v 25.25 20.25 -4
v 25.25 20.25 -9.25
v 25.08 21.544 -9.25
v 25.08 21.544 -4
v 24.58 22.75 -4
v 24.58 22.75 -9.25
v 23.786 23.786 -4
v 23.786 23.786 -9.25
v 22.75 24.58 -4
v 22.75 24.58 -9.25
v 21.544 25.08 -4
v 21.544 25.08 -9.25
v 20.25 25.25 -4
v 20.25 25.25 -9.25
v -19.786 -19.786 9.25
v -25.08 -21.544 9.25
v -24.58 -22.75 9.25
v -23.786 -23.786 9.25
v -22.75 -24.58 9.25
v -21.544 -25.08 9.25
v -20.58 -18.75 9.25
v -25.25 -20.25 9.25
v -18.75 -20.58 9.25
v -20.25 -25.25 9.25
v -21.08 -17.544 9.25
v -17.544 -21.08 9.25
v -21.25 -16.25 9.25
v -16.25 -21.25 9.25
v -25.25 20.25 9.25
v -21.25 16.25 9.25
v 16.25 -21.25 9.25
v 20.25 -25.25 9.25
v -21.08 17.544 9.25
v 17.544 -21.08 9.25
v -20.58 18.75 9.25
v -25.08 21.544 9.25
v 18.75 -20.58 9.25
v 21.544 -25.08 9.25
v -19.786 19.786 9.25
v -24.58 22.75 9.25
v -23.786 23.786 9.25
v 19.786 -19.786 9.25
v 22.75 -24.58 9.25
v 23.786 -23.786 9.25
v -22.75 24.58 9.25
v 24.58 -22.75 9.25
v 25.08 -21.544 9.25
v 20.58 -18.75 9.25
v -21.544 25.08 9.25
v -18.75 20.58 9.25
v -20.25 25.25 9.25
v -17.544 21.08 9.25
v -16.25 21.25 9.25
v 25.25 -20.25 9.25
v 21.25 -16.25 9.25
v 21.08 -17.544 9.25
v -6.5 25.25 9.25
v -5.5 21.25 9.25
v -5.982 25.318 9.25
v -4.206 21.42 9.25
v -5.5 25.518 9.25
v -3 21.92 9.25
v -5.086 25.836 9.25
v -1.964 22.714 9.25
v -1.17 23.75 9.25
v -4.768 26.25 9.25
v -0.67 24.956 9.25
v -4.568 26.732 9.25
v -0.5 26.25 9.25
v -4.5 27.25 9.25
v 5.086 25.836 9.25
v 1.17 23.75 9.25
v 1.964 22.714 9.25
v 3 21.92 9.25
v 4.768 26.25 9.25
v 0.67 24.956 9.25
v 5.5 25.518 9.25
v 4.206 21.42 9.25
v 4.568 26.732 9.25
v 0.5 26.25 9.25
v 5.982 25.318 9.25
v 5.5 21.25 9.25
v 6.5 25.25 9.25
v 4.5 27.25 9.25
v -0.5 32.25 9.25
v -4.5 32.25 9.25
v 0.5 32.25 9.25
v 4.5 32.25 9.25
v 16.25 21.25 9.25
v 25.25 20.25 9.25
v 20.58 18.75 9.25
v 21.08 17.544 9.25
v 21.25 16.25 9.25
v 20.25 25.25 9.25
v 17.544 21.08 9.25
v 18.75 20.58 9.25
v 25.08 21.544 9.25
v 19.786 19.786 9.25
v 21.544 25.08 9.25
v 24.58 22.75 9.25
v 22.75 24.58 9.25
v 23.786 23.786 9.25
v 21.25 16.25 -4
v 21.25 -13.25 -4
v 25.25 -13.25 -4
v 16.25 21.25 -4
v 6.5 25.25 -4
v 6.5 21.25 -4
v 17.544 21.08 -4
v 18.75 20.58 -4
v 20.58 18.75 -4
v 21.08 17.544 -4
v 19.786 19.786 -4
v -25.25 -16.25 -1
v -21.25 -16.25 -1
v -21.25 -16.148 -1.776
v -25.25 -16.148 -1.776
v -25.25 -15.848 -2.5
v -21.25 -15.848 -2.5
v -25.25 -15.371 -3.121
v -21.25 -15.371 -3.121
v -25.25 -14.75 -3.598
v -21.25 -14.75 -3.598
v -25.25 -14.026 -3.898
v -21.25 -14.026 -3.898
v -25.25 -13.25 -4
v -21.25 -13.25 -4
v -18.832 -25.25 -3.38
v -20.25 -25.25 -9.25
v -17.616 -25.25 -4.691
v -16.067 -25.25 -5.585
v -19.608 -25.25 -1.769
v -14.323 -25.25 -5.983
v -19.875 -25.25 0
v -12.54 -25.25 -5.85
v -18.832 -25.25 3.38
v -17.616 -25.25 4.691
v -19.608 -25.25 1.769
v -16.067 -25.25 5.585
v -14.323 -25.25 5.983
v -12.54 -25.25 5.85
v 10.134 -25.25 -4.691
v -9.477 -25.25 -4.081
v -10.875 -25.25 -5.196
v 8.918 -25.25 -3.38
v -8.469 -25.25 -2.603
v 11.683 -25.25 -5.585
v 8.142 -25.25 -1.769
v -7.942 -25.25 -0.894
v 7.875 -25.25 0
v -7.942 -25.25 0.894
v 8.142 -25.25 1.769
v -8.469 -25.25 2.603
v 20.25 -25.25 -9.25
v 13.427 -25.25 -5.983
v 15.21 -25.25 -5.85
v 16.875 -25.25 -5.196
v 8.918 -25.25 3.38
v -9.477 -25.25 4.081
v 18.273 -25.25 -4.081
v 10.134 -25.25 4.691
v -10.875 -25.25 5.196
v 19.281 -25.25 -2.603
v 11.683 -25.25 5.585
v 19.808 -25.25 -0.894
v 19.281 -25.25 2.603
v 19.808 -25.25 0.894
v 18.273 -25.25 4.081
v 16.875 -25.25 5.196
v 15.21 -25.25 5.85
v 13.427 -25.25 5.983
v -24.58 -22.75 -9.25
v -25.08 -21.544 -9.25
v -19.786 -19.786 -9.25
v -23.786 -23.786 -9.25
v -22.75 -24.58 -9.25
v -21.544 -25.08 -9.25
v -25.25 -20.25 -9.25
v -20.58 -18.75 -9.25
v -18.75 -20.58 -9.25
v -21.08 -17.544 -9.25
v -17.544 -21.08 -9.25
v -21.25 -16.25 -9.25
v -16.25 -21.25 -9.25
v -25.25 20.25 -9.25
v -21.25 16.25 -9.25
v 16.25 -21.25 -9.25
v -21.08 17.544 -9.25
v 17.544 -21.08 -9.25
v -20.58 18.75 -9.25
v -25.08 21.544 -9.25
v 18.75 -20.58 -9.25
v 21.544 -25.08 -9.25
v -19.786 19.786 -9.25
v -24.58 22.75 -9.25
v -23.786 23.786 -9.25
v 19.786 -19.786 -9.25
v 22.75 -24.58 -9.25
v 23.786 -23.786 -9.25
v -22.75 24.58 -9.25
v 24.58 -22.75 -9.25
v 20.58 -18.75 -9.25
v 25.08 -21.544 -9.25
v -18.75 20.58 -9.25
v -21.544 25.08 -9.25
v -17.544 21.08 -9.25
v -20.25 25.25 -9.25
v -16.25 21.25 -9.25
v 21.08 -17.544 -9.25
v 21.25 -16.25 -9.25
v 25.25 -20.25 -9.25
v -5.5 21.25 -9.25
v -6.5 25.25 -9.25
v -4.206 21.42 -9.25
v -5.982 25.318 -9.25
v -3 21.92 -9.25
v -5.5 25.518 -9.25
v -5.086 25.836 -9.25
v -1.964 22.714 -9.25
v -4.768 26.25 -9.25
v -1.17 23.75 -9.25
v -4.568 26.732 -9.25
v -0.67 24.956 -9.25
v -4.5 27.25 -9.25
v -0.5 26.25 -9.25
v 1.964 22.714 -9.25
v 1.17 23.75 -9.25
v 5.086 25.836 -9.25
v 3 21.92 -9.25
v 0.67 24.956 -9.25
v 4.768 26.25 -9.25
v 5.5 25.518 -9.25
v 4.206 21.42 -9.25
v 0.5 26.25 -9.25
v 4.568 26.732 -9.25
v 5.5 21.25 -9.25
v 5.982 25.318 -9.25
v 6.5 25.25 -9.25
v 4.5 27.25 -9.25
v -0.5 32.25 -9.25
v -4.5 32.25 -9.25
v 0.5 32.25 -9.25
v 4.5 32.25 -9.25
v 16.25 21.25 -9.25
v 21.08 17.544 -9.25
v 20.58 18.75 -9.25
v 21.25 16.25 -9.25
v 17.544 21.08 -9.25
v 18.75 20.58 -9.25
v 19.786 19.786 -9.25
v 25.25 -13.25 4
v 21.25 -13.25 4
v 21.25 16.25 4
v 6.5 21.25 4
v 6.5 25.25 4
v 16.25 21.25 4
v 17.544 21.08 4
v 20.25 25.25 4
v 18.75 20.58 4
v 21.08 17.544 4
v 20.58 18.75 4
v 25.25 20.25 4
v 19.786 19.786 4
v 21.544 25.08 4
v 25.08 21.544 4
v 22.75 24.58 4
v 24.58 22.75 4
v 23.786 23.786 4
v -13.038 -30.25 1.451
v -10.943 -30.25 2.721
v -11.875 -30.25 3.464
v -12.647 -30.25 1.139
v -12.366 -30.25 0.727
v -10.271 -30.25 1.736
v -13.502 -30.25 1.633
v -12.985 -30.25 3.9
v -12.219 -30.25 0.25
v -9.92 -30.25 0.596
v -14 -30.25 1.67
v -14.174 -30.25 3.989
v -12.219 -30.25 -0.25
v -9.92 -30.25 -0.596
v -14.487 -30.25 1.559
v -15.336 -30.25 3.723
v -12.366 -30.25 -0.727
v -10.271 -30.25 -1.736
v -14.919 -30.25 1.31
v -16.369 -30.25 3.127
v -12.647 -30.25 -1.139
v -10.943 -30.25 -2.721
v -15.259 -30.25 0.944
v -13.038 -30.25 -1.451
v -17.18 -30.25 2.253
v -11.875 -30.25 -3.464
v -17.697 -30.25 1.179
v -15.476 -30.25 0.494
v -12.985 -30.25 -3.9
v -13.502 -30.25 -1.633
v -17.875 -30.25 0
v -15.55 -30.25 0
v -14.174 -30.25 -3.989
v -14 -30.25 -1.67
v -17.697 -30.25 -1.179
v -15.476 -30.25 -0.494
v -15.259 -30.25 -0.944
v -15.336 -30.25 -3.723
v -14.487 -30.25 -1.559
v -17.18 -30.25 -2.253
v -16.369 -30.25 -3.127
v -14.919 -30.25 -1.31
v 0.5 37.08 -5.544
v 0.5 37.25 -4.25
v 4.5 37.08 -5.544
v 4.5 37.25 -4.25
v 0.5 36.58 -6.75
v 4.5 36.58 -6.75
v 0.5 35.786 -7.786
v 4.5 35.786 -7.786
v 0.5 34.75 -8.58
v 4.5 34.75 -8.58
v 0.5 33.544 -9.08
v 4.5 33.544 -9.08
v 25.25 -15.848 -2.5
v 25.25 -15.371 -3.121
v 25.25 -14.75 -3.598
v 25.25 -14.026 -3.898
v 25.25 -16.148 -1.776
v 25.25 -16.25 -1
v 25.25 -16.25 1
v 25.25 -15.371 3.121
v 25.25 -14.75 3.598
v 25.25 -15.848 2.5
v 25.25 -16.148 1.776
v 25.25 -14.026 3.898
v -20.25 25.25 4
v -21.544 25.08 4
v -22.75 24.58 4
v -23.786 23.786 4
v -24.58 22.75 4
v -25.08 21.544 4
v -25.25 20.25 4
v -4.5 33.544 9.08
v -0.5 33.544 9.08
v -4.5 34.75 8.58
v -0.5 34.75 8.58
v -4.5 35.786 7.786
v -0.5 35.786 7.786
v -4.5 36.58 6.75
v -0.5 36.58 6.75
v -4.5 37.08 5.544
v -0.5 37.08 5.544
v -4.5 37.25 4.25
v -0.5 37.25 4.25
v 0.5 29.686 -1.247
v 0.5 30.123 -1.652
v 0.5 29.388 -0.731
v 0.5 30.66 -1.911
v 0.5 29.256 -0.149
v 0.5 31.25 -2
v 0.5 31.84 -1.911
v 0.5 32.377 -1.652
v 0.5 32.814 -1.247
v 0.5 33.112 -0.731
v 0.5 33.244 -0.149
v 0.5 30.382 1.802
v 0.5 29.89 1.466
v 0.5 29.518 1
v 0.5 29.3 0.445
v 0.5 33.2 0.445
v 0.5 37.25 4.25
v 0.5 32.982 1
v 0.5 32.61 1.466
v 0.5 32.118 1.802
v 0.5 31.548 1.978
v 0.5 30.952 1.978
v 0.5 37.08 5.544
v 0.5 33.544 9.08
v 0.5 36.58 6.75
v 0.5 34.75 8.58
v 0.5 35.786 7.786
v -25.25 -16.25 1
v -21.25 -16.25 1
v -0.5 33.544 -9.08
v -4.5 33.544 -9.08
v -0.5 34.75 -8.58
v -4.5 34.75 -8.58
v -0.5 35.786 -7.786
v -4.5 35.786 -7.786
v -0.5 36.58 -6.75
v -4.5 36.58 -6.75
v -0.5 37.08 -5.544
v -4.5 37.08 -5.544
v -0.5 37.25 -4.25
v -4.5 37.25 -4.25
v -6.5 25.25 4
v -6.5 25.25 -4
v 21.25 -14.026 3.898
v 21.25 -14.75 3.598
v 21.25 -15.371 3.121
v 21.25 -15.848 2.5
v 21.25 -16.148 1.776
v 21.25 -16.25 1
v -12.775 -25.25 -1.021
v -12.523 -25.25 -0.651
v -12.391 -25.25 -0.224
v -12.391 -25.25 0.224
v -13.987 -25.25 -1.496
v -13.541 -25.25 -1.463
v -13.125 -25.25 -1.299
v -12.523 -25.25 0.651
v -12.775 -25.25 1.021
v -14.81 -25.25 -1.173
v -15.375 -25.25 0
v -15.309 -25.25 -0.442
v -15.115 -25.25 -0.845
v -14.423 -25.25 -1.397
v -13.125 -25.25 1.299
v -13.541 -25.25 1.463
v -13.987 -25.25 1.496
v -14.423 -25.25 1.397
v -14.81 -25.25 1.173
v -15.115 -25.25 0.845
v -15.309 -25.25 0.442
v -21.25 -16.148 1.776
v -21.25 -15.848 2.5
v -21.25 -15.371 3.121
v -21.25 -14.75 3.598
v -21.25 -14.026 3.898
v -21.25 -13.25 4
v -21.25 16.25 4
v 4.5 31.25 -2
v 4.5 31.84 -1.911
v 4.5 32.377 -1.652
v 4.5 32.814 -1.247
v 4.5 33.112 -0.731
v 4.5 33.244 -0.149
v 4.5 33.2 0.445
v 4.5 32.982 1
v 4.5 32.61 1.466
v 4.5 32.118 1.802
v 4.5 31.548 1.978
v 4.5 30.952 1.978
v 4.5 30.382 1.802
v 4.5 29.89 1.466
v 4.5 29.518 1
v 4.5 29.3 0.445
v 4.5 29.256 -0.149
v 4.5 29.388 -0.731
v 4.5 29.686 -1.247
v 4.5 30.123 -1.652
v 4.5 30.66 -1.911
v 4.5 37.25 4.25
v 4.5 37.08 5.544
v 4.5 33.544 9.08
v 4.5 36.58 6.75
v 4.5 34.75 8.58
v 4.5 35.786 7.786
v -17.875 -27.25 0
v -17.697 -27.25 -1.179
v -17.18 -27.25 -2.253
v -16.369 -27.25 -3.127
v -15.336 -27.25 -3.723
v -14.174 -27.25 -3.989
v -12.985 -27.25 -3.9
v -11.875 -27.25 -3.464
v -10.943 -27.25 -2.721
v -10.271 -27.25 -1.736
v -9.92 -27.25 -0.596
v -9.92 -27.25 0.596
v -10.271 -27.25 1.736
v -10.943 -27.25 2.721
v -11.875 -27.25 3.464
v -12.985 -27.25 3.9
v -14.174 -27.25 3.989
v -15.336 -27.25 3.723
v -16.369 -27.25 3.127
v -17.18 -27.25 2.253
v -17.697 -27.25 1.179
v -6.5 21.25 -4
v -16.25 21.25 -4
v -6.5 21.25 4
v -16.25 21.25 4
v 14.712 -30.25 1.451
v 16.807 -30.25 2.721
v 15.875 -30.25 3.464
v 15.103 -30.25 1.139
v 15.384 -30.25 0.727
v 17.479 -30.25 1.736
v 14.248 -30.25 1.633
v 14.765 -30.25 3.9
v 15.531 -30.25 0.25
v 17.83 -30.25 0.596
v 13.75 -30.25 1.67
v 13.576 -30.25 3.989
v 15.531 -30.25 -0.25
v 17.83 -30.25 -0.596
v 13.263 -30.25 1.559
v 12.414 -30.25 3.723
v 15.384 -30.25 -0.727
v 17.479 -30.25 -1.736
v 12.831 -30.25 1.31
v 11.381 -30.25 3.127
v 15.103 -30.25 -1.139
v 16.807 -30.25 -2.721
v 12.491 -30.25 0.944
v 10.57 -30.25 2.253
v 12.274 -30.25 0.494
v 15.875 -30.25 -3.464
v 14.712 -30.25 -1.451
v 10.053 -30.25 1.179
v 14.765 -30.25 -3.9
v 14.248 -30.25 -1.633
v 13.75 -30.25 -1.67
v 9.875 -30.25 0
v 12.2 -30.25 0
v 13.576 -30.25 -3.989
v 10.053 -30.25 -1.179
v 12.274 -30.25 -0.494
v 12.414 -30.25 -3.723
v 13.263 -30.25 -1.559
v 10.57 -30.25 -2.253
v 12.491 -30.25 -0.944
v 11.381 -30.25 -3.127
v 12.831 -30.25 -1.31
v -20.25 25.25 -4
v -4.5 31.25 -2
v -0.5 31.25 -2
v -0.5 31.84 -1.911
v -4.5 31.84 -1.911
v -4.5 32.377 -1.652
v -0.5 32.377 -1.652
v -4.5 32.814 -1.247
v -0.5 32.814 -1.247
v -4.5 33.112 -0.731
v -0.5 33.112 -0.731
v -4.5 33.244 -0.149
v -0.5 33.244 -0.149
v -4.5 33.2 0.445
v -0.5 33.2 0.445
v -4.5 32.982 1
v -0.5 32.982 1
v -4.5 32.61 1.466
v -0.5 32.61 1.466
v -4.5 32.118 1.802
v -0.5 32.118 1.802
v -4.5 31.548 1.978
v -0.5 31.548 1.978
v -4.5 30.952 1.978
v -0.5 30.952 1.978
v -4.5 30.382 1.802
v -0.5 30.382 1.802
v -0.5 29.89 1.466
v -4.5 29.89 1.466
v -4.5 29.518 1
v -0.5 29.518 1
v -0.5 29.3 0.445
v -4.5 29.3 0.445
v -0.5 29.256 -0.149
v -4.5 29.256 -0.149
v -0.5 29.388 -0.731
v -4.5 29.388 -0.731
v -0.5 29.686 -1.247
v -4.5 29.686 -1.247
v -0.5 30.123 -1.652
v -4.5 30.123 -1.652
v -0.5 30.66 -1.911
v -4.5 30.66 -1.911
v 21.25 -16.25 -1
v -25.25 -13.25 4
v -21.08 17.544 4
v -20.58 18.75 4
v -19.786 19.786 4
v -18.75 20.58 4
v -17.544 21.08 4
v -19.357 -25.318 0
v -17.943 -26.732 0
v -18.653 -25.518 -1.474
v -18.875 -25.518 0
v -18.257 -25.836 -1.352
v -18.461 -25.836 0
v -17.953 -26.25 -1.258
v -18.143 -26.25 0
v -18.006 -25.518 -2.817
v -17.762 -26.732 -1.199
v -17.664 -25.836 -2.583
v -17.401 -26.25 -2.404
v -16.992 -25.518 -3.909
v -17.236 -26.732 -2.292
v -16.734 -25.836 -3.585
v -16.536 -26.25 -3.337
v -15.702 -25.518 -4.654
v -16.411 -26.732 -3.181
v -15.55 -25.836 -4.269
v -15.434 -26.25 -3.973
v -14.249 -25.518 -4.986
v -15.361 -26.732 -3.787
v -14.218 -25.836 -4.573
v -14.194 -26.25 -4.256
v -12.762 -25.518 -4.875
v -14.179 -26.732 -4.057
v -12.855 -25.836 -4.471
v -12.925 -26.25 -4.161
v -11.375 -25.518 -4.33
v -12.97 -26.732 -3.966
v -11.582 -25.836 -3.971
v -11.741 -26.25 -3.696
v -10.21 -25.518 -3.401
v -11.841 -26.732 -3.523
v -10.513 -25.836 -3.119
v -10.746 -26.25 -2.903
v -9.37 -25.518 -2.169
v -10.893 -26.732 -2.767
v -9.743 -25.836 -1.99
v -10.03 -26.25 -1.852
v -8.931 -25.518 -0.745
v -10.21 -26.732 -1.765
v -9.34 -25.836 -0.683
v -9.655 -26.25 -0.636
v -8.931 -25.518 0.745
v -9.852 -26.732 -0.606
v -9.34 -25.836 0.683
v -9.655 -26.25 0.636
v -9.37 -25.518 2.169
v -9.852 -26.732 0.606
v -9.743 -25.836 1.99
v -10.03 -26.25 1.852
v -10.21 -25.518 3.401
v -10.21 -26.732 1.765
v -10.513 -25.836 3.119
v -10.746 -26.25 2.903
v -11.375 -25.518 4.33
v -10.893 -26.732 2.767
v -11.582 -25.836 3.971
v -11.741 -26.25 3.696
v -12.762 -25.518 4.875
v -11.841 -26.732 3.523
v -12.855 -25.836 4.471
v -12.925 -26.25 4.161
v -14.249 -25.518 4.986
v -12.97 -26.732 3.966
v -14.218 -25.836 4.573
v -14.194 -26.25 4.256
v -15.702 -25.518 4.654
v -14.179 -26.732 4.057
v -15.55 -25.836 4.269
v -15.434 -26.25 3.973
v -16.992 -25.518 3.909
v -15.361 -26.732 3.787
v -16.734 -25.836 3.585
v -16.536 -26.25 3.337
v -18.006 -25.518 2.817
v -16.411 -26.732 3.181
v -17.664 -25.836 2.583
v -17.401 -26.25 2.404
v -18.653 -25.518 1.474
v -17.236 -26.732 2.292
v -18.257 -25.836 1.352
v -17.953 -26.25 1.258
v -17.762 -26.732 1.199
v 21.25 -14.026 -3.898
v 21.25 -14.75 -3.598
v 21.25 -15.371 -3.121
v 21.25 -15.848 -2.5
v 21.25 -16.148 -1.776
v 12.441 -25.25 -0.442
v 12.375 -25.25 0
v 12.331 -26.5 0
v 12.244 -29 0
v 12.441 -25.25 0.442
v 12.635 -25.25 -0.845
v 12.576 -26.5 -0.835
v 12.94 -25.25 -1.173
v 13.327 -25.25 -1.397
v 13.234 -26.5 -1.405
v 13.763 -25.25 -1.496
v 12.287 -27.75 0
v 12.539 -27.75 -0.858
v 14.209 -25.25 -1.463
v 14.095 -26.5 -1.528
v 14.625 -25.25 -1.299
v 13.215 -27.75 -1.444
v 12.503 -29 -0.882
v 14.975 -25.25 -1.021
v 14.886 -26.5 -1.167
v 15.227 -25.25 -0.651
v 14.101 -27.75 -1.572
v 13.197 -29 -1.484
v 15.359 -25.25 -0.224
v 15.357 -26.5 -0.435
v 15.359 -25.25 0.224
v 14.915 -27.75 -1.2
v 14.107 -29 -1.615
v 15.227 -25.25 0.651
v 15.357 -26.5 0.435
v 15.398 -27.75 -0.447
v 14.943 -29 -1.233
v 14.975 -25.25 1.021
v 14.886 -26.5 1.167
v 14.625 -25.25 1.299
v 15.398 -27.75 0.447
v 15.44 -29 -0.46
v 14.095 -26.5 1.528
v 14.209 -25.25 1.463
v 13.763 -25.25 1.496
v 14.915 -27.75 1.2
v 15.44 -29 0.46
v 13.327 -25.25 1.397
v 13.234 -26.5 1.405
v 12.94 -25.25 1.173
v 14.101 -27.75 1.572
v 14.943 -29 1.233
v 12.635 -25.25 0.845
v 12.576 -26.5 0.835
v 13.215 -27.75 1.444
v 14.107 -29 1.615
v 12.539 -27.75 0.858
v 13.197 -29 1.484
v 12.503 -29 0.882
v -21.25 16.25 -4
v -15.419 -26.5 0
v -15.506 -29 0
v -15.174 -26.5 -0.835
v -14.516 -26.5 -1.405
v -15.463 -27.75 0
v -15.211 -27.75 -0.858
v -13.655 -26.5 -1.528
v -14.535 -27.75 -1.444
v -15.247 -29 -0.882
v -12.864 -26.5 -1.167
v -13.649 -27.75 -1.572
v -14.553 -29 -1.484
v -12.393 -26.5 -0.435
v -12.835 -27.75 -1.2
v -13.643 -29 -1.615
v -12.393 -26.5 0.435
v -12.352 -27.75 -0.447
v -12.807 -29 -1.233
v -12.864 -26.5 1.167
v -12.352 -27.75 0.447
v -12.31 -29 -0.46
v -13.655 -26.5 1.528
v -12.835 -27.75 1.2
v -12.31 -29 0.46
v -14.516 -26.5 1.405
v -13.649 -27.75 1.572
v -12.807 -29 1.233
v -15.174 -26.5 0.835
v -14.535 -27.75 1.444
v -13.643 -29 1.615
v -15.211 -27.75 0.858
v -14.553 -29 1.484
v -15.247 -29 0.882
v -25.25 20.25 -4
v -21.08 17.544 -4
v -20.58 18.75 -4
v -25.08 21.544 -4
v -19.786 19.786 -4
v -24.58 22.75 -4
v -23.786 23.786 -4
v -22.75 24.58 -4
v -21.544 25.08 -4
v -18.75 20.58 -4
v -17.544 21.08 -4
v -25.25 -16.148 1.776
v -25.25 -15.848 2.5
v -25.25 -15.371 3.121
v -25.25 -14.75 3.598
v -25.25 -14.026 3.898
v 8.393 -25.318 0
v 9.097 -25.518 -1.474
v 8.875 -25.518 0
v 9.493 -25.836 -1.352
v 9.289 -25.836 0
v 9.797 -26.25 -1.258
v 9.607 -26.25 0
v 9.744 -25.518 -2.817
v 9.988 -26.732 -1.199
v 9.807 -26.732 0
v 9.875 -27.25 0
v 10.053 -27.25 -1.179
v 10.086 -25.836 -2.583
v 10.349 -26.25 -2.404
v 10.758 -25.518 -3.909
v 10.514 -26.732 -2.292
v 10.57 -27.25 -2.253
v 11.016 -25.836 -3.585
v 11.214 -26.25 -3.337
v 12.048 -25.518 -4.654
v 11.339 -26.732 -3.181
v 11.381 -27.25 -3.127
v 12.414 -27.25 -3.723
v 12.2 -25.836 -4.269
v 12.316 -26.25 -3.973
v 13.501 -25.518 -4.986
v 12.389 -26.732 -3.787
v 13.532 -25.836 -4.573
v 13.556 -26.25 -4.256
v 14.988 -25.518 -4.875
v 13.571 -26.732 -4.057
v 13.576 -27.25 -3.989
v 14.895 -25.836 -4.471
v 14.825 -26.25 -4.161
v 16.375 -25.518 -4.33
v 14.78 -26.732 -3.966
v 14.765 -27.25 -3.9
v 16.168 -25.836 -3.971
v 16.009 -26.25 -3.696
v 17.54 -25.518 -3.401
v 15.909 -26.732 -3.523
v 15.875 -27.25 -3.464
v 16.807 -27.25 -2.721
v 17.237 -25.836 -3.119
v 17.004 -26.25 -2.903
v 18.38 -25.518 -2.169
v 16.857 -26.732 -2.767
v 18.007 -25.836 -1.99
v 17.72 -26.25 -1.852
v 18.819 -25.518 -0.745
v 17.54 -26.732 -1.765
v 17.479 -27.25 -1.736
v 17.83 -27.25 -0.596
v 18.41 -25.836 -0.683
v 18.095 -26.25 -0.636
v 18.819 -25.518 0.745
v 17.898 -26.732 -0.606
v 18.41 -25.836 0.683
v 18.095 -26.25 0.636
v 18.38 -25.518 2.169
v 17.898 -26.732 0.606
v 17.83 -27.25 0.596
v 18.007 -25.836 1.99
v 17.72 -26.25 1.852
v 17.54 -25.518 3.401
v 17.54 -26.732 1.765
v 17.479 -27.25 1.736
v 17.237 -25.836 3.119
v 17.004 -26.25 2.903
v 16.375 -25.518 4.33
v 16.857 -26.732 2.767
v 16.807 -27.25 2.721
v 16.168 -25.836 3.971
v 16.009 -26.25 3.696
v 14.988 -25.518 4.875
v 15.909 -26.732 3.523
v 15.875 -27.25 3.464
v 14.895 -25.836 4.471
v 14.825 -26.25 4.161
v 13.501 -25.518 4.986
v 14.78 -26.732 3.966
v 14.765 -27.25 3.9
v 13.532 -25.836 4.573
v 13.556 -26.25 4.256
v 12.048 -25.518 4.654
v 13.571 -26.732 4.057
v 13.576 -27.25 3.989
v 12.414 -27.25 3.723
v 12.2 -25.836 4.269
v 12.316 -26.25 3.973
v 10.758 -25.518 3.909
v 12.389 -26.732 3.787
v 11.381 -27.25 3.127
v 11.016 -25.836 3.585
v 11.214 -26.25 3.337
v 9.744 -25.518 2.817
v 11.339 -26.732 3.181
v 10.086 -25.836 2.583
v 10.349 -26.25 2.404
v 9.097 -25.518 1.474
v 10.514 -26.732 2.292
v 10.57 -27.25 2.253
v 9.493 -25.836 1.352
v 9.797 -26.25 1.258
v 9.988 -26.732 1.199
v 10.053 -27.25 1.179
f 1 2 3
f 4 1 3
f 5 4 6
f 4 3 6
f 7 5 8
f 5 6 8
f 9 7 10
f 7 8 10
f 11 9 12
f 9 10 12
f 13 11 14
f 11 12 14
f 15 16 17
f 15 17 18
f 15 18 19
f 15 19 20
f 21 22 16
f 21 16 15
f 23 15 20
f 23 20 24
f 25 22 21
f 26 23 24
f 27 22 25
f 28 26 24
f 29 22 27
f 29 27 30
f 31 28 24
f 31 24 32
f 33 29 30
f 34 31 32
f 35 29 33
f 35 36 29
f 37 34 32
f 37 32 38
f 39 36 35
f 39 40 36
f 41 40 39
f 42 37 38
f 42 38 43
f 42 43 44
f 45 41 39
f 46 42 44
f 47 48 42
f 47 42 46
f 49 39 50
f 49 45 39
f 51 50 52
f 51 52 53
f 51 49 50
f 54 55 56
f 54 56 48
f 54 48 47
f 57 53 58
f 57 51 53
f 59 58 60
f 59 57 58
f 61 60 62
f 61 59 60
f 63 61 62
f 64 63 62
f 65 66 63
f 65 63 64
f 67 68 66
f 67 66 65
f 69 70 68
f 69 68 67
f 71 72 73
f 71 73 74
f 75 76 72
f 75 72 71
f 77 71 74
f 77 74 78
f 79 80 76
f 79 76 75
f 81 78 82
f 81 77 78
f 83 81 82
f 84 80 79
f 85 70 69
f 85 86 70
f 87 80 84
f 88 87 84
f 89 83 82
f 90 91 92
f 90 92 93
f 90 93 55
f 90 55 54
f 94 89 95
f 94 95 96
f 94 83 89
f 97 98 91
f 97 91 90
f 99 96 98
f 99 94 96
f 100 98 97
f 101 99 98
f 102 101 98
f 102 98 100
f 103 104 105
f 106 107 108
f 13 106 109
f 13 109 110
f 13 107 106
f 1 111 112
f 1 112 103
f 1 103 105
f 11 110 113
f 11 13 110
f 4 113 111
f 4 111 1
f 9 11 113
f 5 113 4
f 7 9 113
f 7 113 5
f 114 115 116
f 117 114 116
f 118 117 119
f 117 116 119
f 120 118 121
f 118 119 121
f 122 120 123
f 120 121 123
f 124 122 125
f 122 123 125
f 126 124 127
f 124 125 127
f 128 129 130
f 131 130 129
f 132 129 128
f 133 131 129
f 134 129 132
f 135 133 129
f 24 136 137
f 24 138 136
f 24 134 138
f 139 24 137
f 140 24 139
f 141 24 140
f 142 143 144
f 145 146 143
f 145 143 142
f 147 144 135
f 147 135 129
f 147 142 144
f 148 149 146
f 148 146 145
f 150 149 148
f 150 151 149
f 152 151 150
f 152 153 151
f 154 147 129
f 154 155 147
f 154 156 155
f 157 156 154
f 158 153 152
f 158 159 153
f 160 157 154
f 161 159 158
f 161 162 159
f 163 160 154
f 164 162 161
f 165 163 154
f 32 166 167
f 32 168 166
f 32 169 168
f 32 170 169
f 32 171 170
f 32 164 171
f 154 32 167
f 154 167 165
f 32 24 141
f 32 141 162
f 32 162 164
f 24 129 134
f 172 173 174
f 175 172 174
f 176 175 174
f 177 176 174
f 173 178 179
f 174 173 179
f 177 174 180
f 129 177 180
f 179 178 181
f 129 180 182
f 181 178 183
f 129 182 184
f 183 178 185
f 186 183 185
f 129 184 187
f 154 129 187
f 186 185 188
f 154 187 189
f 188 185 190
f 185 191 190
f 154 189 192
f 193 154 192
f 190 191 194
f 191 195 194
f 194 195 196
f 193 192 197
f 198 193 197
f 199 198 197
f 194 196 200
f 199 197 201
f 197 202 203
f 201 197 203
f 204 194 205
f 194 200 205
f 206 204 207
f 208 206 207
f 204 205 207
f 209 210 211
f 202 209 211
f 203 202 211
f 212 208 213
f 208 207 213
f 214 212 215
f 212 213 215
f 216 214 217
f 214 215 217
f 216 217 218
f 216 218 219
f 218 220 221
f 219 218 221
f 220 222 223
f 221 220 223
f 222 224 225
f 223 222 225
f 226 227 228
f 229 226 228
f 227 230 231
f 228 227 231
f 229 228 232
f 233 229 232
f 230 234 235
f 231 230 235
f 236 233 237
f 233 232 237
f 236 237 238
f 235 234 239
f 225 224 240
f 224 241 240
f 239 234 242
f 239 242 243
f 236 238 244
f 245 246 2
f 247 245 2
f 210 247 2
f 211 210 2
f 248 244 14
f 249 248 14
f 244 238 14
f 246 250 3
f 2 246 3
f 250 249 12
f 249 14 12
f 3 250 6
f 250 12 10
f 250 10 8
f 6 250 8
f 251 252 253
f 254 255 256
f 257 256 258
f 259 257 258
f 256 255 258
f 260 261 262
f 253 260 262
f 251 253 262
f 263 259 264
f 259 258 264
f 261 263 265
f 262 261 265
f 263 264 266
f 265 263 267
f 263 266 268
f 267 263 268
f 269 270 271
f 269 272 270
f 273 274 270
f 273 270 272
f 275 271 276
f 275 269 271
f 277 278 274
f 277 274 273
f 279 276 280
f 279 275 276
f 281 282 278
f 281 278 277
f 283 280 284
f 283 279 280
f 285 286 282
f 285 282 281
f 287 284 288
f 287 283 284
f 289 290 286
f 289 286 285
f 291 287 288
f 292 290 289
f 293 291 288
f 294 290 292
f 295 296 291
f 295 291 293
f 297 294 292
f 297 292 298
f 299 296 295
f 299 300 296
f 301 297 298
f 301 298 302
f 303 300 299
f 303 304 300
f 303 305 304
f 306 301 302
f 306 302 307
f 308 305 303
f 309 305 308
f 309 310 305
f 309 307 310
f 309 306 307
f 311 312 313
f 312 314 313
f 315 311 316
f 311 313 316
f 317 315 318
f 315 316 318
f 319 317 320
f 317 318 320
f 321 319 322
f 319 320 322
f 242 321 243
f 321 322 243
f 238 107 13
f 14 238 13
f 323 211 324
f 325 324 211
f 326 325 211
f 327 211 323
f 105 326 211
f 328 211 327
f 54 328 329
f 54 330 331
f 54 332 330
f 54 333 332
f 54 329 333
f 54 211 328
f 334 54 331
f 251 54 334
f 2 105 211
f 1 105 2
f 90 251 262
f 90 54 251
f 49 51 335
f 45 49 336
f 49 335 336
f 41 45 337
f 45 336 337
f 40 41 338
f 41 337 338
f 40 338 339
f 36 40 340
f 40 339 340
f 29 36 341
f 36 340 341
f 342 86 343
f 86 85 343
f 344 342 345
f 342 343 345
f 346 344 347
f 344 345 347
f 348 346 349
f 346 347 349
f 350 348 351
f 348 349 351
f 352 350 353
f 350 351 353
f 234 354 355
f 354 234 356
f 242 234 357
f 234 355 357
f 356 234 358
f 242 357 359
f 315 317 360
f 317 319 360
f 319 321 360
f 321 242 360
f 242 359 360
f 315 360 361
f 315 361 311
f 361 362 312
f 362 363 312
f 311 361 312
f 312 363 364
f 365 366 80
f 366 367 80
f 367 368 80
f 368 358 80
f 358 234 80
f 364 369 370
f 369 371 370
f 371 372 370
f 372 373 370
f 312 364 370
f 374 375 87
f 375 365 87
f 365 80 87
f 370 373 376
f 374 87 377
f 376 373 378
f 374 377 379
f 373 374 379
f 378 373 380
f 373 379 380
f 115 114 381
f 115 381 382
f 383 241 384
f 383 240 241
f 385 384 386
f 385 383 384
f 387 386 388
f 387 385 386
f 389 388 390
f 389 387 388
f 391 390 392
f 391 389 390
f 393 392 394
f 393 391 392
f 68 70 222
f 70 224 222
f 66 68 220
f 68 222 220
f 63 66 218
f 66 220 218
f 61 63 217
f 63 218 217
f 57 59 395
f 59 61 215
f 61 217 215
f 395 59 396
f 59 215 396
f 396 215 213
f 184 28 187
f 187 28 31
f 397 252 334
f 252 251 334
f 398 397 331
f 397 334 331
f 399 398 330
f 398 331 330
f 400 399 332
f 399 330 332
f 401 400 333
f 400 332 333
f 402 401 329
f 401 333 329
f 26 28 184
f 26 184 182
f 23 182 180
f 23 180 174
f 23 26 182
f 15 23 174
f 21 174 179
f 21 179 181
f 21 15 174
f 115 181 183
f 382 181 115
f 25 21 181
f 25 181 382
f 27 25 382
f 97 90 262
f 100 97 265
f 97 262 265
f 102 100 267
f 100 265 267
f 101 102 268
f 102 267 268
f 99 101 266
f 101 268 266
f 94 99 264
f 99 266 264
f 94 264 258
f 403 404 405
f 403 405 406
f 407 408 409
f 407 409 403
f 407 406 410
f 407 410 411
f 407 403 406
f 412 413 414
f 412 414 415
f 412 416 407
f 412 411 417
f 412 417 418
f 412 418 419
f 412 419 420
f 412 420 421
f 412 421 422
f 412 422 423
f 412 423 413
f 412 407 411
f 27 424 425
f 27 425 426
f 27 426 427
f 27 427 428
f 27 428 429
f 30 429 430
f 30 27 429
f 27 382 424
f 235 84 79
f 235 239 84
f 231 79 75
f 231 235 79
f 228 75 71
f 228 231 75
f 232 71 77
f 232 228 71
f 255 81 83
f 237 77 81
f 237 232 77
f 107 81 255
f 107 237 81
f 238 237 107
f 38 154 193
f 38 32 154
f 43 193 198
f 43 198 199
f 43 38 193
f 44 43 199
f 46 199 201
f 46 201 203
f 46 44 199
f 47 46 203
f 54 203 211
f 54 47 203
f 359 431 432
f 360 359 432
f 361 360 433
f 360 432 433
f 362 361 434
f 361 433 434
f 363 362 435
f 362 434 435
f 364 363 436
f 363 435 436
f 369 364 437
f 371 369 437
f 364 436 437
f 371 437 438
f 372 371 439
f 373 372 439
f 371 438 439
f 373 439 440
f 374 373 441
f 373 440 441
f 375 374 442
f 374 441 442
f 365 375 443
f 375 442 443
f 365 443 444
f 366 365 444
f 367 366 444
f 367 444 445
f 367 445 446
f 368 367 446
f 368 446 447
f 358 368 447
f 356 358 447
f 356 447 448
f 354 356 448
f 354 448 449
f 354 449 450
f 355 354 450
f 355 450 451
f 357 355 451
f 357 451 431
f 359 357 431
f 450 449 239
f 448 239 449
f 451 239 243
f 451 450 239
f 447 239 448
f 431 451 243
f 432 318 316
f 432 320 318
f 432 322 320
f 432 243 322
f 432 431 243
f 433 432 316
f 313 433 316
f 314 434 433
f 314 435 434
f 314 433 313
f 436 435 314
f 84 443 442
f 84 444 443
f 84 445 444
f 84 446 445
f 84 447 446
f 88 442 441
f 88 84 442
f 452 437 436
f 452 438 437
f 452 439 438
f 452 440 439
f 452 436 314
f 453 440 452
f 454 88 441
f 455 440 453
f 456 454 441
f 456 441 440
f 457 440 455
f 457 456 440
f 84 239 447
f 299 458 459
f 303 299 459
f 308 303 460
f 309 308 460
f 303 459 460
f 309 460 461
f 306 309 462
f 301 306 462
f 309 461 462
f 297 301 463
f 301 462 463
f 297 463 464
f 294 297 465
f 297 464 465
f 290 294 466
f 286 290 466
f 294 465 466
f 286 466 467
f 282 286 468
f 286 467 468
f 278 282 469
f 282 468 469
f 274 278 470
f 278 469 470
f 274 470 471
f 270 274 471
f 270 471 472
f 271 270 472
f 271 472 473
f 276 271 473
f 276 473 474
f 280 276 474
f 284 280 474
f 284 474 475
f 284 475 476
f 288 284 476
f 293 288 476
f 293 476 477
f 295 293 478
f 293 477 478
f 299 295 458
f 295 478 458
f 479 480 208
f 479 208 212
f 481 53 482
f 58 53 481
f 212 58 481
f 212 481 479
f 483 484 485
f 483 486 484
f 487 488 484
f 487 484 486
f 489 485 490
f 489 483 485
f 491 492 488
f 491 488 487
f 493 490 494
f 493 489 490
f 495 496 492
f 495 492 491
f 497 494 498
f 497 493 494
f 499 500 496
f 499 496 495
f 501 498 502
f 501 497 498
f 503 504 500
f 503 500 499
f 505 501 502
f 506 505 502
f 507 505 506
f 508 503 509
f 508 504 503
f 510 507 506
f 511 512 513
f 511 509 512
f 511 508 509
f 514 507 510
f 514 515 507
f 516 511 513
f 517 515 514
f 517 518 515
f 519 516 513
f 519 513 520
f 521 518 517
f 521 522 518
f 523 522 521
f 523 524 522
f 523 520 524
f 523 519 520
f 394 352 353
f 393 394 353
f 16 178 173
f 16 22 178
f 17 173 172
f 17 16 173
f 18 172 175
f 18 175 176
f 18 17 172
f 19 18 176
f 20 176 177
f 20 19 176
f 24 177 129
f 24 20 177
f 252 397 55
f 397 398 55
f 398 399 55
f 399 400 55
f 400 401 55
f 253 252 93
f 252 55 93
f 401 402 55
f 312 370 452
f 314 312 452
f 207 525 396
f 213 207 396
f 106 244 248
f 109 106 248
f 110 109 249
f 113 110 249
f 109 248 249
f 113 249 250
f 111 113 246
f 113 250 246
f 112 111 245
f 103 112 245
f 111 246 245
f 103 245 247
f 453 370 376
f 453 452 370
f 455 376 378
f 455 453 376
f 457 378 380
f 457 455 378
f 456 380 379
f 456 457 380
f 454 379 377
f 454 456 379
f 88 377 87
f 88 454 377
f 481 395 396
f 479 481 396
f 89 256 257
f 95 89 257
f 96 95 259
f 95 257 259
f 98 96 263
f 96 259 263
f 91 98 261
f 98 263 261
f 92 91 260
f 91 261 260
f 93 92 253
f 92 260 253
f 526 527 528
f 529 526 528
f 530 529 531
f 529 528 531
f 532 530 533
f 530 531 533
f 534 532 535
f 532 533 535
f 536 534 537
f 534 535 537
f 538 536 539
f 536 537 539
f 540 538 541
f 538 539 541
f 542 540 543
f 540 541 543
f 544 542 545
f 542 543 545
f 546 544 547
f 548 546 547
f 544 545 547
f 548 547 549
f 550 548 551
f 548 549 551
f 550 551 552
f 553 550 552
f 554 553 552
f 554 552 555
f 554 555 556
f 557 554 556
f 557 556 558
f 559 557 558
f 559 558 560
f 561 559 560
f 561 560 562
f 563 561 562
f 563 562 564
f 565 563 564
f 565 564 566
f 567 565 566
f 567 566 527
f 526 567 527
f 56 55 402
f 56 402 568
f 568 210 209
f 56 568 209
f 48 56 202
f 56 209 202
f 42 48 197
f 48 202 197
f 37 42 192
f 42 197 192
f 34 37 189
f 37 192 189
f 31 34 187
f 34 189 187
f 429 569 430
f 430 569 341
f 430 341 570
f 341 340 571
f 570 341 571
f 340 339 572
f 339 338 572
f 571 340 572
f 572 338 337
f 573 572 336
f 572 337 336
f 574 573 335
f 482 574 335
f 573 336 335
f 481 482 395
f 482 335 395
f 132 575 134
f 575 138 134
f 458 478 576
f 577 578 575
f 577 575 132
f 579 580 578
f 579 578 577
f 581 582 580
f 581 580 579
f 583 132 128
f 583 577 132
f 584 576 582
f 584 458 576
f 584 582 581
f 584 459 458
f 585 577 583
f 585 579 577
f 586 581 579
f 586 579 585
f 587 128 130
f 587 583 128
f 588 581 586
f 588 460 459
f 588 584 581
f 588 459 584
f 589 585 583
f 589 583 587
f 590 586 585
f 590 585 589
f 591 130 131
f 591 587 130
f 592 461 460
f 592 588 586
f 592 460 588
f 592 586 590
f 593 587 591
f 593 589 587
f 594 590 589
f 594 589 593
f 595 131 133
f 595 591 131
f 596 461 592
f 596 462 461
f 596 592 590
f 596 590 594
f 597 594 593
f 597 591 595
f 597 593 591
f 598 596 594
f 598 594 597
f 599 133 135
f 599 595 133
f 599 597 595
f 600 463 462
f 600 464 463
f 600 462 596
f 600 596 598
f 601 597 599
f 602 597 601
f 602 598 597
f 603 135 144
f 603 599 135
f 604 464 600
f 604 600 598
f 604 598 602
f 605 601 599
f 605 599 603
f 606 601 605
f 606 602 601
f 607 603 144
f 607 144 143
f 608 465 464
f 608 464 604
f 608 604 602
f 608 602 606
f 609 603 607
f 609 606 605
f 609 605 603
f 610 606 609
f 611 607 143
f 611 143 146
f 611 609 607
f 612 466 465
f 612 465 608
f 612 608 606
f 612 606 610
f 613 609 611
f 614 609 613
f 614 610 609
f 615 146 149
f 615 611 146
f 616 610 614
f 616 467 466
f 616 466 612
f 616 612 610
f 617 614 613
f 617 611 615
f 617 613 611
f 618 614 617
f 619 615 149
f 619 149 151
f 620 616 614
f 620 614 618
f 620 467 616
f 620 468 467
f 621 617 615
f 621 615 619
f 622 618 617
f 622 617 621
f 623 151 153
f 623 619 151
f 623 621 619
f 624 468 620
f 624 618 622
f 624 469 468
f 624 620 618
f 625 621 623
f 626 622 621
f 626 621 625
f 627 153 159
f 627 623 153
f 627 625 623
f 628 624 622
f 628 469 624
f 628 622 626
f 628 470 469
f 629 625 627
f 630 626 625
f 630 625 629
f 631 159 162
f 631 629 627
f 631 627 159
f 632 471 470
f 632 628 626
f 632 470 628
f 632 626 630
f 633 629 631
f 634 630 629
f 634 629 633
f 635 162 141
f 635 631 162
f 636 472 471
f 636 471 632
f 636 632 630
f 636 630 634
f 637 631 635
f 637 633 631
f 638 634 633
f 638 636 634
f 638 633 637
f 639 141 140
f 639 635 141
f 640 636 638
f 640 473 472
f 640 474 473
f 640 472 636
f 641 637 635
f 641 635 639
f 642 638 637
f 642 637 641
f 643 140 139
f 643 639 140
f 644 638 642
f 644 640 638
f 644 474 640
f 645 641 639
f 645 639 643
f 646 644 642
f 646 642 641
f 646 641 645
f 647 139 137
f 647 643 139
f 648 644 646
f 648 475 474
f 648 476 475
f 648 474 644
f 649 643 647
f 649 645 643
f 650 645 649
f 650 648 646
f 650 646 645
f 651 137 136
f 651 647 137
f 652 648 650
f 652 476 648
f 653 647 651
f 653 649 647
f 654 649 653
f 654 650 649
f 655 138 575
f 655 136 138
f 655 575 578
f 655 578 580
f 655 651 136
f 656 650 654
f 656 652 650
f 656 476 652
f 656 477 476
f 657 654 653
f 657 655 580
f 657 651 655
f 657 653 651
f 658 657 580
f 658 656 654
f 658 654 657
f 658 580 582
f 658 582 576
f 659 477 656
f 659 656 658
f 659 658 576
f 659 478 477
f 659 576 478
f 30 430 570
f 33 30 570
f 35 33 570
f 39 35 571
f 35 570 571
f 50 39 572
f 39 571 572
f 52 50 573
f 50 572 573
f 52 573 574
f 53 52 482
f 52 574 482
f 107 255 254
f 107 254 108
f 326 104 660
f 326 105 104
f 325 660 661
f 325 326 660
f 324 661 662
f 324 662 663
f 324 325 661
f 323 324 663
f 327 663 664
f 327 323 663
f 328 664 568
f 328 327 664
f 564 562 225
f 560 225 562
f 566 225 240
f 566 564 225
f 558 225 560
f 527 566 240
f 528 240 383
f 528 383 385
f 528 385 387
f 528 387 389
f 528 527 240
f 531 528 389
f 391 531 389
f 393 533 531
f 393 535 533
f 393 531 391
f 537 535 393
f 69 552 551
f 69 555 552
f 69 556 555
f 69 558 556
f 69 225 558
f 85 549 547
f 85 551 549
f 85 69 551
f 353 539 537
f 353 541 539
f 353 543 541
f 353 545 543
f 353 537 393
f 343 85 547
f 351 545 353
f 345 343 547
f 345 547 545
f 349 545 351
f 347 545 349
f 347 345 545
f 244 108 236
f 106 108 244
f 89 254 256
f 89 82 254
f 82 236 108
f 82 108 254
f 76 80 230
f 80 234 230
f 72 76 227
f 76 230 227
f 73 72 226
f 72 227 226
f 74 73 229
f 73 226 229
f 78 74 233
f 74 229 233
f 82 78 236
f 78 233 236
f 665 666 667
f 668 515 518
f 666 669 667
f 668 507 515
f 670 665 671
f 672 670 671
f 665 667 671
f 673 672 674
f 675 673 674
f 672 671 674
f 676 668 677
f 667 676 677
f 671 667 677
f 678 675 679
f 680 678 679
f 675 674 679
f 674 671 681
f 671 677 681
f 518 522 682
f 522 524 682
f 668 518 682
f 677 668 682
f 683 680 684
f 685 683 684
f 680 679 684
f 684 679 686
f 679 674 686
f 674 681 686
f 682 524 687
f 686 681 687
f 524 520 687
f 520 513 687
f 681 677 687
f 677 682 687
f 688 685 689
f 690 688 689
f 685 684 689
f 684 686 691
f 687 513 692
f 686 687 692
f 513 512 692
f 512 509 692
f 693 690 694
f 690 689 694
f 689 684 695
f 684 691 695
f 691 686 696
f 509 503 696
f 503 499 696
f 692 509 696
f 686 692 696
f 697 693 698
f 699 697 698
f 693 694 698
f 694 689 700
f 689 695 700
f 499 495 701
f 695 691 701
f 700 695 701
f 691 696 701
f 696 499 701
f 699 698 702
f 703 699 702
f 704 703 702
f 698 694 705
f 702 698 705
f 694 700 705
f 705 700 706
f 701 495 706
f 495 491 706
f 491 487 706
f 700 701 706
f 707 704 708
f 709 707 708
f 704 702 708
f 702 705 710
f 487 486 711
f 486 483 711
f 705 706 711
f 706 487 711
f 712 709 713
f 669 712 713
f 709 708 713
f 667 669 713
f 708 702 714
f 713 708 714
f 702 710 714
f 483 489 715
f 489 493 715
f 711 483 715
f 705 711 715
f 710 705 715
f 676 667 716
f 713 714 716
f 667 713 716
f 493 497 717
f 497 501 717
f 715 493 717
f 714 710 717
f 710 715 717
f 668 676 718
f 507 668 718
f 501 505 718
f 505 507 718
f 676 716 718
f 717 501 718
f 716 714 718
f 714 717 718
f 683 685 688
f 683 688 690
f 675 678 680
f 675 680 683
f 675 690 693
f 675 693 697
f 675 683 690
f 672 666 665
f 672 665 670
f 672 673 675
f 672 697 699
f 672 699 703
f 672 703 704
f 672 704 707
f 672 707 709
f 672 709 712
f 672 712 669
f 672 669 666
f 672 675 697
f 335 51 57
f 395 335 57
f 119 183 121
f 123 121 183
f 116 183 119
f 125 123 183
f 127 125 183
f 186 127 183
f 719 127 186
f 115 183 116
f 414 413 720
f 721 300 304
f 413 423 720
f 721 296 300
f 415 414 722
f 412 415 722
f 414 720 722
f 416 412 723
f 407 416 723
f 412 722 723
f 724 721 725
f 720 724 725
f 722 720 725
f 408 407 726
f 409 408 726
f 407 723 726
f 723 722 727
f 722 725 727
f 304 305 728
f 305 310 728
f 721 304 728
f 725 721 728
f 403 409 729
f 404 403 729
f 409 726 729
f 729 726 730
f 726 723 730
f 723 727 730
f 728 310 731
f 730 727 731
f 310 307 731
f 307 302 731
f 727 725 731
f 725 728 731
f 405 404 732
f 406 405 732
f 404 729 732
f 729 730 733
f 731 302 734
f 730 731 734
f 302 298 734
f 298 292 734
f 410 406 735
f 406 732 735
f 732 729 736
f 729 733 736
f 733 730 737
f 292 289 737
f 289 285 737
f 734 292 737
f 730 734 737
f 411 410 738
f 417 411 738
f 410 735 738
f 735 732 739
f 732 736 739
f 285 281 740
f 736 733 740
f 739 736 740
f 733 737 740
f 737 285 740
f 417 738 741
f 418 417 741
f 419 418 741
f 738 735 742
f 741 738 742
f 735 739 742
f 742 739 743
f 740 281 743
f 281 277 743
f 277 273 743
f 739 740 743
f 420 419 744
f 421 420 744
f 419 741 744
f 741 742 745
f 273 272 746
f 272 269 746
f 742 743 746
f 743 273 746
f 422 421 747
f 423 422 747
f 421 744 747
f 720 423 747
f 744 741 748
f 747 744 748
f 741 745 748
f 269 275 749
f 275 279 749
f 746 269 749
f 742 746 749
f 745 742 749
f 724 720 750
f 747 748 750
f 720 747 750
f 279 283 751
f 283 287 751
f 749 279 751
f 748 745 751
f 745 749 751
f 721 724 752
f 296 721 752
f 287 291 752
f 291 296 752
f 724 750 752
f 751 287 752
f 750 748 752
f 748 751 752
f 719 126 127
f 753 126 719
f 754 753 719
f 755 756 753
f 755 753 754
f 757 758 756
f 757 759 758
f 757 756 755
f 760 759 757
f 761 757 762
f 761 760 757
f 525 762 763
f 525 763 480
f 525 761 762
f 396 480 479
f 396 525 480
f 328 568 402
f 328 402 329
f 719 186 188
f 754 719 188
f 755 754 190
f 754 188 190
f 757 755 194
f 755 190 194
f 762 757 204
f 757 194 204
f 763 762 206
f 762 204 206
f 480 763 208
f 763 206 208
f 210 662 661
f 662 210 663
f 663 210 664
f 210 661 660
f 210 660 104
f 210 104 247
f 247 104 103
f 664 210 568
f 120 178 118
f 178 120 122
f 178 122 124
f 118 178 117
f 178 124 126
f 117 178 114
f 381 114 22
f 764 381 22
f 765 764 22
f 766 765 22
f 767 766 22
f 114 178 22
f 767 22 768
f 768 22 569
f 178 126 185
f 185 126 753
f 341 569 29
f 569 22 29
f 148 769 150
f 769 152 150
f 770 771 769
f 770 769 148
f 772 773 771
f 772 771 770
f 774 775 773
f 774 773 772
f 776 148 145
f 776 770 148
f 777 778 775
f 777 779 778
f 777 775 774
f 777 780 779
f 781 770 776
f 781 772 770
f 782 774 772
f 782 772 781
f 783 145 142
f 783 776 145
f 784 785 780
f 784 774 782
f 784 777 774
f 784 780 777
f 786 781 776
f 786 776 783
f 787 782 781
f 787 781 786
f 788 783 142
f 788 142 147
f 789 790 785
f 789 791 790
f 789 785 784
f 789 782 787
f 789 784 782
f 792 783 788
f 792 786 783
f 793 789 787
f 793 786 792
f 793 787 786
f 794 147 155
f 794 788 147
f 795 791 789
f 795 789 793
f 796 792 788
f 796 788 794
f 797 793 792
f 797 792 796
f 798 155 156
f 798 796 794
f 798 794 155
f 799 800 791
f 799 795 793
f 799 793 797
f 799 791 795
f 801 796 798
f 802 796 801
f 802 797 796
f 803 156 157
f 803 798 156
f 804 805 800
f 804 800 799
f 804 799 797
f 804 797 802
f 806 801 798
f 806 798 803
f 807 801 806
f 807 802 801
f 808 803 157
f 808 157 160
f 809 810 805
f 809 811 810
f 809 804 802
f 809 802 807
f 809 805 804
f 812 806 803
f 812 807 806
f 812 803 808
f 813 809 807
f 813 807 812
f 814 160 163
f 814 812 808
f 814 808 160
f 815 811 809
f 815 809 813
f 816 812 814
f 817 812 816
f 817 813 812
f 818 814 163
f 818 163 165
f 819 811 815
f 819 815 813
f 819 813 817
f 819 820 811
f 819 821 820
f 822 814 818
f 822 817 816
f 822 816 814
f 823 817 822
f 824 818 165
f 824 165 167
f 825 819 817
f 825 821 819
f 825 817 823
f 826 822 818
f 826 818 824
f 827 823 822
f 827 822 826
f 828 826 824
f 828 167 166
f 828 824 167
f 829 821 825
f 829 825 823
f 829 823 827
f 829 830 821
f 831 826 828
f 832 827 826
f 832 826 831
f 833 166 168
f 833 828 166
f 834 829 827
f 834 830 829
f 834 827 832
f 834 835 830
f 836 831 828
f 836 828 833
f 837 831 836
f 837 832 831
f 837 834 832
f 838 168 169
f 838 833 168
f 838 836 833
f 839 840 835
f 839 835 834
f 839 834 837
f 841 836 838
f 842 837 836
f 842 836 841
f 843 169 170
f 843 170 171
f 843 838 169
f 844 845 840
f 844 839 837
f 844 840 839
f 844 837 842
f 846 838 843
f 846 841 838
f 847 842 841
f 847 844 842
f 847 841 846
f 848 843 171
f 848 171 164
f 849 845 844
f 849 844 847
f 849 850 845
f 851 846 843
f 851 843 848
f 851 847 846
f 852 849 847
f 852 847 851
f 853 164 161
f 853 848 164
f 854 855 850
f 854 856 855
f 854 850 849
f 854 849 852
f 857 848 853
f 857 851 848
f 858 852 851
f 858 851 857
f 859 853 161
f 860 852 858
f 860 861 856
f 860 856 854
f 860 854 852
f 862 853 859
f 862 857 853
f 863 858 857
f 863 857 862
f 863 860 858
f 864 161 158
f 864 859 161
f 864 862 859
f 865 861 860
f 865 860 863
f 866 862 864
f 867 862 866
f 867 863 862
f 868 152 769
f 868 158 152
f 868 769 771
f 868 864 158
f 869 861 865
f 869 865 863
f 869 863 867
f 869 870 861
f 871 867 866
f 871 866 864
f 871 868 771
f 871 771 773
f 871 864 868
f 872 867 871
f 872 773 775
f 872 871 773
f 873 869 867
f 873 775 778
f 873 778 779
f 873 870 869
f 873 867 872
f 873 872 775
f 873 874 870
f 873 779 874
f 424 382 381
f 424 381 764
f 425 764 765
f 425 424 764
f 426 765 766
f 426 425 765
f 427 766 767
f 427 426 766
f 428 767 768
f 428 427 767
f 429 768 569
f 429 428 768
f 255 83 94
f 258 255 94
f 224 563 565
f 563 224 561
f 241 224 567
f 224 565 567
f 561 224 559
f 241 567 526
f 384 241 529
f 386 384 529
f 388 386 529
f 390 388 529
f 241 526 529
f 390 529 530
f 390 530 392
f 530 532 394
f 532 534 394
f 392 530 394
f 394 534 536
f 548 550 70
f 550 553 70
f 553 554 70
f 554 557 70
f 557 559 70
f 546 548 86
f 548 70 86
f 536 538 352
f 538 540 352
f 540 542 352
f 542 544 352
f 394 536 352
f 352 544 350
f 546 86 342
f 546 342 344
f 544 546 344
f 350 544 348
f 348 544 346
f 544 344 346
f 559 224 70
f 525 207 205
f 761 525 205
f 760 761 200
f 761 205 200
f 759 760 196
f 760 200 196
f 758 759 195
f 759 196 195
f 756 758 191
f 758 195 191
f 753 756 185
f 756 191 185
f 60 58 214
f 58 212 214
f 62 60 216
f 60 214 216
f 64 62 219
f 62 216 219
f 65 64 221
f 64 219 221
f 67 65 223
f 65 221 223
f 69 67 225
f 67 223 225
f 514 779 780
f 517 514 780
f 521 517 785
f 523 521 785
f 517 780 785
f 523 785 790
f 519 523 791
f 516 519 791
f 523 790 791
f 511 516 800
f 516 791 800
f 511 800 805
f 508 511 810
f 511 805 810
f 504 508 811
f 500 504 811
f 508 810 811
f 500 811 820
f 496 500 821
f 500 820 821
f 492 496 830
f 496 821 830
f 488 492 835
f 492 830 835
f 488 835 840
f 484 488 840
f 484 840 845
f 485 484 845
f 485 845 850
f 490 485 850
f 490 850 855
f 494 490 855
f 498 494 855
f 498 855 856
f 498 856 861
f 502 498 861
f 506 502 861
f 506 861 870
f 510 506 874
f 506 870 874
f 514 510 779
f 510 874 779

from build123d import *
from OCP.BRepFilletAPI import BRepFilletAPI_MakeFillet

# Parameters (mm, degrees)
SKETCH1_W                    = 50.5
SKETCH1_H                    = 50.5
SKETCH1_W_2                  = 42.5
SKETCH1_H_2                  = 42.5
BOSS_EXTRUDE1_DEPTH          = 9.25
SKETCH2_W                    = 1
SKETCH2_H                    = 4
CUT_EXTRUDE1_DEPTH           = 41.21660105
SKETCH3_W                    = 4
SKETCH3_H                    = 12
BOSS_EXTRUDE2_DEPTH          = 18.5
SKETCH4_R                    = 2
CUT_EXTRUDE2_DEPTH           = 49.561172762
FILLET1_R1                   = 5
FILLET1_R2                   = 2
SKETCH5_W                    = 18.75
SKETCH5_H                    = 8
CUT_EXTRUDE3_DEPTH           = 41.5
FILLET2_R                    = 3
SKETCH6_R                    = 4
BOSS_EXTRUDE3_DEPTH          = 5
SKETCH7_R                    = 1.675
CUT_EXTRUDE4_DEPTH           = 5
CUT_EXTRUDE4_DRAFT           = -2
CUT_EXTRUDE4_PROFILE_2_DEPTH = 5
CUT_EXTRUDE4_PROFILE_2_DRAFT = -2
FILLET3_R                    = 2


with BuildPart() as part:
    # Sketch1 → Boss-Extrude1 (new, symmetric)
    with BuildSketch(Plane.XY):
        Rectangle(SKETCH1_W, SKETCH1_H)
        Rectangle(SKETCH1_W_2, SKETCH1_H_2, mode=Mode.SUBTRACT)
    extrude(amount=BOSS_EXTRUDE1_DEPTH, both=True)

    # Sketch2 → Cut-Extrude1 (cut, through all)
    with BuildSketch(Plane.XY.offset(9.25)):
        with Locations((0, 23.25)):
            Rectangle(SKETCH2_W, SKETCH2_H)
    extrude(amount=-CUT_EXTRUDE1_DEPTH, mode=Mode.SUBTRACT)

    # Sketch3 → Boss-Extrude2 (add)
    with BuildSketch(Plane.XY.offset(9.25)):
        with Locations((2.5, 31.25)):
            Rectangle(SKETCH3_W, SKETCH3_H)
        with Locations((-2.5, 31.25)):
            Rectangle(SKETCH3_W, SKETCH3_H)
    extrude(amount=-BOSS_EXTRUDE2_DEPTH)

    # Sketch4 → Cut-Extrude2 (cut, through all)
    with BuildSketch(Plane(origin=(4.5, 0, 0), x_dir=(0, 0, -1), z_dir=(1, 0, 0))):
        with Locations((0, 31.25)):
            Circle(SKETCH4_R)
    extrude(amount=-CUT_EXTRUDE2_DEPTH, mode=Mode.SUBTRACT)

    # Fillet1: one fillet with a radius per group of edges: ONE call of the kernel's fillet builder (fillet() takes one radius for all edges)
    fillet1_edges_1 = [part.edges().sort_by_distance(p)[0] for p in [
        (-21.25, 21.25, 0),
        (-21.25, -21.25, 0),
        (21.25, -21.25, 0),
        (21.25, 21.25, 0),
        (-0.5, 21.25, 0),
        (0.5, 21.25, 0),
        (2.5, 37.25, 9.25),
        (2.5, 37.25, -9.25),
        (-2.5, 37.25, 9.25),
        (-2.5, 37.25, -9.25),
        (25.25, -25.25, 0),
        (-25.25, -25.25, 0),
        (-25.25, 25.25, 0),
        (25.25, 25.25, 0),
    ]]
    fillet1_edges_2 = [part.edges().sort_by_distance(p)[0] for p in [
        (4.5, 25.25, 0),
        (-4.5, 25.25, 0),
    ]]
    fillet1 = BRepFilletAPI_MakeFillet(part.part.solid().wrapped)
    for e in fillet1_edges_1:
        fillet1.Add(FILLET1_R1, e.wrapped)
    for e in fillet1_edges_2:
        fillet1.Add(FILLET1_R2, e.wrapped)
    add(Compound.cast(fillet1.Shape()), mode=Mode.REPLACE)

    # Sketch5 → Cut-Extrude3 (cut)
    with BuildSketch(Plane(origin=(0, 25.25, 0), x_dir=(1, 0, 0), z_dir=(0, 1, 0))):
        with Locations((-15.875, 0)):
            Rectangle(SKETCH5_W, SKETCH5_H)
        with Locations((15.875, 0)):
            Rectangle(SKETCH5_W, SKETCH5_H)
    extrude(amount=-CUT_EXTRUDE3_DEPTH, mode=Mode.SUBTRACT)

    # Fillet2
    fillet2_edges = [part.edges().sort_by_distance(p)[0] for p in [
        (-23.25, -16.25, 4),
        (-23.25, -16.25, -4),
        (23.25, -16.25, -4),
        (23.25, -16.25, 4),
    ]]
    fillet(fillet2_edges, radius=FILLET2_R)

    # Sketch6 → Boss-Extrude3 (add)
    with BuildSketch(Plane(origin=(0, -25.25, 0), x_dir=(-1, 0, 0), z_dir=(0, -1, 0))):
        with Locations((-13.875, 0)):
            Circle(SKETCH6_R)
        with Locations((13.875, 0)):
            Circle(SKETCH6_R)
    extrude(amount=BOSS_EXTRUDE3_DEPTH)


with BuildPart() as cut_extrude4_tool:
    # Sketch7 → Cut-Extrude4 (with draft: the straight prism first)
    with BuildSketch(Plane(origin=(0, -30.25, 0), x_dir=(-1, 0, 0), z_dir=(0, -1, 0))):
        with Locations((-13.875, 0)):
            Circle(SKETCH7_R)
    extrude(amount=-CUT_EXTRUDE4_DEPTH)
    # Cut-Extrude4: the draft: its side faces are tilted about the plane it starts from
    cut_extrude4_sides = [cut_extrude4_tool.faces().sort_by_distance(p)[0] for p in [
        (15.55, -27.75, 0),
    ]]
    draft(cut_extrude4_sides, Plane(origin=(0, -30.25, 0), x_dir=(-1, 0, 0), z_dir=(0, -1, 0)), CUT_EXTRUDE4_DRAFT)


with BuildPart() as part_1:
    add(part.part)

    # Cut-Extrude4: cut by cut_extrude4_tool
    add(cut_extrude4_tool.part, mode=Mode.SUBTRACT)


with BuildPart() as cut_extrude4_profile_2_tool:
    # Sketch7 → Cut-Extrude4 profile 2 (with draft: the straight prism first)
    with BuildSketch(Plane(origin=(0, -30.25, 0), x_dir=(-1, 0, 0), z_dir=(0, -1, 0))):
        with Locations((13.875, 0)):
            Circle(SKETCH7_R)
    extrude(amount=-CUT_EXTRUDE4_PROFILE_2_DEPTH)
    # Cut-Extrude4 profile 2: the draft: its side faces are tilted about the plane it starts from
    cut_extrude4_profile_2_sides = [cut_extrude4_profile_2_tool.faces().sort_by_distance(p)[0] for p in [
        (-12.2, -27.75, 0),
    ]]
    draft(cut_extrude4_profile_2_sides, Plane(origin=(0, -30.25, 0), x_dir=(-1, 0, 0), z_dir=(0, -1, 0)), CUT_EXTRUDE4_PROFILE_2_DRAFT)


with BuildPart() as part_2:
    add(part_1.part)

    # Cut-Extrude4 profile 2: cut by cut_extrude4_profile_2_tool
    add(cut_extrude4_profile_2_tool.part, mode=Mode.SUBTRACT)

    # Fillet3
    fillet3_edges = [part_2.edges().sort_by_distance(p)[0] for p in [
        (17.875, -25.25, 0),
        (-9.875, -25.25, 0),
    ]]
    fillet(fillet3_edges, radius=FILLET3_R)


solid = part_2.part
